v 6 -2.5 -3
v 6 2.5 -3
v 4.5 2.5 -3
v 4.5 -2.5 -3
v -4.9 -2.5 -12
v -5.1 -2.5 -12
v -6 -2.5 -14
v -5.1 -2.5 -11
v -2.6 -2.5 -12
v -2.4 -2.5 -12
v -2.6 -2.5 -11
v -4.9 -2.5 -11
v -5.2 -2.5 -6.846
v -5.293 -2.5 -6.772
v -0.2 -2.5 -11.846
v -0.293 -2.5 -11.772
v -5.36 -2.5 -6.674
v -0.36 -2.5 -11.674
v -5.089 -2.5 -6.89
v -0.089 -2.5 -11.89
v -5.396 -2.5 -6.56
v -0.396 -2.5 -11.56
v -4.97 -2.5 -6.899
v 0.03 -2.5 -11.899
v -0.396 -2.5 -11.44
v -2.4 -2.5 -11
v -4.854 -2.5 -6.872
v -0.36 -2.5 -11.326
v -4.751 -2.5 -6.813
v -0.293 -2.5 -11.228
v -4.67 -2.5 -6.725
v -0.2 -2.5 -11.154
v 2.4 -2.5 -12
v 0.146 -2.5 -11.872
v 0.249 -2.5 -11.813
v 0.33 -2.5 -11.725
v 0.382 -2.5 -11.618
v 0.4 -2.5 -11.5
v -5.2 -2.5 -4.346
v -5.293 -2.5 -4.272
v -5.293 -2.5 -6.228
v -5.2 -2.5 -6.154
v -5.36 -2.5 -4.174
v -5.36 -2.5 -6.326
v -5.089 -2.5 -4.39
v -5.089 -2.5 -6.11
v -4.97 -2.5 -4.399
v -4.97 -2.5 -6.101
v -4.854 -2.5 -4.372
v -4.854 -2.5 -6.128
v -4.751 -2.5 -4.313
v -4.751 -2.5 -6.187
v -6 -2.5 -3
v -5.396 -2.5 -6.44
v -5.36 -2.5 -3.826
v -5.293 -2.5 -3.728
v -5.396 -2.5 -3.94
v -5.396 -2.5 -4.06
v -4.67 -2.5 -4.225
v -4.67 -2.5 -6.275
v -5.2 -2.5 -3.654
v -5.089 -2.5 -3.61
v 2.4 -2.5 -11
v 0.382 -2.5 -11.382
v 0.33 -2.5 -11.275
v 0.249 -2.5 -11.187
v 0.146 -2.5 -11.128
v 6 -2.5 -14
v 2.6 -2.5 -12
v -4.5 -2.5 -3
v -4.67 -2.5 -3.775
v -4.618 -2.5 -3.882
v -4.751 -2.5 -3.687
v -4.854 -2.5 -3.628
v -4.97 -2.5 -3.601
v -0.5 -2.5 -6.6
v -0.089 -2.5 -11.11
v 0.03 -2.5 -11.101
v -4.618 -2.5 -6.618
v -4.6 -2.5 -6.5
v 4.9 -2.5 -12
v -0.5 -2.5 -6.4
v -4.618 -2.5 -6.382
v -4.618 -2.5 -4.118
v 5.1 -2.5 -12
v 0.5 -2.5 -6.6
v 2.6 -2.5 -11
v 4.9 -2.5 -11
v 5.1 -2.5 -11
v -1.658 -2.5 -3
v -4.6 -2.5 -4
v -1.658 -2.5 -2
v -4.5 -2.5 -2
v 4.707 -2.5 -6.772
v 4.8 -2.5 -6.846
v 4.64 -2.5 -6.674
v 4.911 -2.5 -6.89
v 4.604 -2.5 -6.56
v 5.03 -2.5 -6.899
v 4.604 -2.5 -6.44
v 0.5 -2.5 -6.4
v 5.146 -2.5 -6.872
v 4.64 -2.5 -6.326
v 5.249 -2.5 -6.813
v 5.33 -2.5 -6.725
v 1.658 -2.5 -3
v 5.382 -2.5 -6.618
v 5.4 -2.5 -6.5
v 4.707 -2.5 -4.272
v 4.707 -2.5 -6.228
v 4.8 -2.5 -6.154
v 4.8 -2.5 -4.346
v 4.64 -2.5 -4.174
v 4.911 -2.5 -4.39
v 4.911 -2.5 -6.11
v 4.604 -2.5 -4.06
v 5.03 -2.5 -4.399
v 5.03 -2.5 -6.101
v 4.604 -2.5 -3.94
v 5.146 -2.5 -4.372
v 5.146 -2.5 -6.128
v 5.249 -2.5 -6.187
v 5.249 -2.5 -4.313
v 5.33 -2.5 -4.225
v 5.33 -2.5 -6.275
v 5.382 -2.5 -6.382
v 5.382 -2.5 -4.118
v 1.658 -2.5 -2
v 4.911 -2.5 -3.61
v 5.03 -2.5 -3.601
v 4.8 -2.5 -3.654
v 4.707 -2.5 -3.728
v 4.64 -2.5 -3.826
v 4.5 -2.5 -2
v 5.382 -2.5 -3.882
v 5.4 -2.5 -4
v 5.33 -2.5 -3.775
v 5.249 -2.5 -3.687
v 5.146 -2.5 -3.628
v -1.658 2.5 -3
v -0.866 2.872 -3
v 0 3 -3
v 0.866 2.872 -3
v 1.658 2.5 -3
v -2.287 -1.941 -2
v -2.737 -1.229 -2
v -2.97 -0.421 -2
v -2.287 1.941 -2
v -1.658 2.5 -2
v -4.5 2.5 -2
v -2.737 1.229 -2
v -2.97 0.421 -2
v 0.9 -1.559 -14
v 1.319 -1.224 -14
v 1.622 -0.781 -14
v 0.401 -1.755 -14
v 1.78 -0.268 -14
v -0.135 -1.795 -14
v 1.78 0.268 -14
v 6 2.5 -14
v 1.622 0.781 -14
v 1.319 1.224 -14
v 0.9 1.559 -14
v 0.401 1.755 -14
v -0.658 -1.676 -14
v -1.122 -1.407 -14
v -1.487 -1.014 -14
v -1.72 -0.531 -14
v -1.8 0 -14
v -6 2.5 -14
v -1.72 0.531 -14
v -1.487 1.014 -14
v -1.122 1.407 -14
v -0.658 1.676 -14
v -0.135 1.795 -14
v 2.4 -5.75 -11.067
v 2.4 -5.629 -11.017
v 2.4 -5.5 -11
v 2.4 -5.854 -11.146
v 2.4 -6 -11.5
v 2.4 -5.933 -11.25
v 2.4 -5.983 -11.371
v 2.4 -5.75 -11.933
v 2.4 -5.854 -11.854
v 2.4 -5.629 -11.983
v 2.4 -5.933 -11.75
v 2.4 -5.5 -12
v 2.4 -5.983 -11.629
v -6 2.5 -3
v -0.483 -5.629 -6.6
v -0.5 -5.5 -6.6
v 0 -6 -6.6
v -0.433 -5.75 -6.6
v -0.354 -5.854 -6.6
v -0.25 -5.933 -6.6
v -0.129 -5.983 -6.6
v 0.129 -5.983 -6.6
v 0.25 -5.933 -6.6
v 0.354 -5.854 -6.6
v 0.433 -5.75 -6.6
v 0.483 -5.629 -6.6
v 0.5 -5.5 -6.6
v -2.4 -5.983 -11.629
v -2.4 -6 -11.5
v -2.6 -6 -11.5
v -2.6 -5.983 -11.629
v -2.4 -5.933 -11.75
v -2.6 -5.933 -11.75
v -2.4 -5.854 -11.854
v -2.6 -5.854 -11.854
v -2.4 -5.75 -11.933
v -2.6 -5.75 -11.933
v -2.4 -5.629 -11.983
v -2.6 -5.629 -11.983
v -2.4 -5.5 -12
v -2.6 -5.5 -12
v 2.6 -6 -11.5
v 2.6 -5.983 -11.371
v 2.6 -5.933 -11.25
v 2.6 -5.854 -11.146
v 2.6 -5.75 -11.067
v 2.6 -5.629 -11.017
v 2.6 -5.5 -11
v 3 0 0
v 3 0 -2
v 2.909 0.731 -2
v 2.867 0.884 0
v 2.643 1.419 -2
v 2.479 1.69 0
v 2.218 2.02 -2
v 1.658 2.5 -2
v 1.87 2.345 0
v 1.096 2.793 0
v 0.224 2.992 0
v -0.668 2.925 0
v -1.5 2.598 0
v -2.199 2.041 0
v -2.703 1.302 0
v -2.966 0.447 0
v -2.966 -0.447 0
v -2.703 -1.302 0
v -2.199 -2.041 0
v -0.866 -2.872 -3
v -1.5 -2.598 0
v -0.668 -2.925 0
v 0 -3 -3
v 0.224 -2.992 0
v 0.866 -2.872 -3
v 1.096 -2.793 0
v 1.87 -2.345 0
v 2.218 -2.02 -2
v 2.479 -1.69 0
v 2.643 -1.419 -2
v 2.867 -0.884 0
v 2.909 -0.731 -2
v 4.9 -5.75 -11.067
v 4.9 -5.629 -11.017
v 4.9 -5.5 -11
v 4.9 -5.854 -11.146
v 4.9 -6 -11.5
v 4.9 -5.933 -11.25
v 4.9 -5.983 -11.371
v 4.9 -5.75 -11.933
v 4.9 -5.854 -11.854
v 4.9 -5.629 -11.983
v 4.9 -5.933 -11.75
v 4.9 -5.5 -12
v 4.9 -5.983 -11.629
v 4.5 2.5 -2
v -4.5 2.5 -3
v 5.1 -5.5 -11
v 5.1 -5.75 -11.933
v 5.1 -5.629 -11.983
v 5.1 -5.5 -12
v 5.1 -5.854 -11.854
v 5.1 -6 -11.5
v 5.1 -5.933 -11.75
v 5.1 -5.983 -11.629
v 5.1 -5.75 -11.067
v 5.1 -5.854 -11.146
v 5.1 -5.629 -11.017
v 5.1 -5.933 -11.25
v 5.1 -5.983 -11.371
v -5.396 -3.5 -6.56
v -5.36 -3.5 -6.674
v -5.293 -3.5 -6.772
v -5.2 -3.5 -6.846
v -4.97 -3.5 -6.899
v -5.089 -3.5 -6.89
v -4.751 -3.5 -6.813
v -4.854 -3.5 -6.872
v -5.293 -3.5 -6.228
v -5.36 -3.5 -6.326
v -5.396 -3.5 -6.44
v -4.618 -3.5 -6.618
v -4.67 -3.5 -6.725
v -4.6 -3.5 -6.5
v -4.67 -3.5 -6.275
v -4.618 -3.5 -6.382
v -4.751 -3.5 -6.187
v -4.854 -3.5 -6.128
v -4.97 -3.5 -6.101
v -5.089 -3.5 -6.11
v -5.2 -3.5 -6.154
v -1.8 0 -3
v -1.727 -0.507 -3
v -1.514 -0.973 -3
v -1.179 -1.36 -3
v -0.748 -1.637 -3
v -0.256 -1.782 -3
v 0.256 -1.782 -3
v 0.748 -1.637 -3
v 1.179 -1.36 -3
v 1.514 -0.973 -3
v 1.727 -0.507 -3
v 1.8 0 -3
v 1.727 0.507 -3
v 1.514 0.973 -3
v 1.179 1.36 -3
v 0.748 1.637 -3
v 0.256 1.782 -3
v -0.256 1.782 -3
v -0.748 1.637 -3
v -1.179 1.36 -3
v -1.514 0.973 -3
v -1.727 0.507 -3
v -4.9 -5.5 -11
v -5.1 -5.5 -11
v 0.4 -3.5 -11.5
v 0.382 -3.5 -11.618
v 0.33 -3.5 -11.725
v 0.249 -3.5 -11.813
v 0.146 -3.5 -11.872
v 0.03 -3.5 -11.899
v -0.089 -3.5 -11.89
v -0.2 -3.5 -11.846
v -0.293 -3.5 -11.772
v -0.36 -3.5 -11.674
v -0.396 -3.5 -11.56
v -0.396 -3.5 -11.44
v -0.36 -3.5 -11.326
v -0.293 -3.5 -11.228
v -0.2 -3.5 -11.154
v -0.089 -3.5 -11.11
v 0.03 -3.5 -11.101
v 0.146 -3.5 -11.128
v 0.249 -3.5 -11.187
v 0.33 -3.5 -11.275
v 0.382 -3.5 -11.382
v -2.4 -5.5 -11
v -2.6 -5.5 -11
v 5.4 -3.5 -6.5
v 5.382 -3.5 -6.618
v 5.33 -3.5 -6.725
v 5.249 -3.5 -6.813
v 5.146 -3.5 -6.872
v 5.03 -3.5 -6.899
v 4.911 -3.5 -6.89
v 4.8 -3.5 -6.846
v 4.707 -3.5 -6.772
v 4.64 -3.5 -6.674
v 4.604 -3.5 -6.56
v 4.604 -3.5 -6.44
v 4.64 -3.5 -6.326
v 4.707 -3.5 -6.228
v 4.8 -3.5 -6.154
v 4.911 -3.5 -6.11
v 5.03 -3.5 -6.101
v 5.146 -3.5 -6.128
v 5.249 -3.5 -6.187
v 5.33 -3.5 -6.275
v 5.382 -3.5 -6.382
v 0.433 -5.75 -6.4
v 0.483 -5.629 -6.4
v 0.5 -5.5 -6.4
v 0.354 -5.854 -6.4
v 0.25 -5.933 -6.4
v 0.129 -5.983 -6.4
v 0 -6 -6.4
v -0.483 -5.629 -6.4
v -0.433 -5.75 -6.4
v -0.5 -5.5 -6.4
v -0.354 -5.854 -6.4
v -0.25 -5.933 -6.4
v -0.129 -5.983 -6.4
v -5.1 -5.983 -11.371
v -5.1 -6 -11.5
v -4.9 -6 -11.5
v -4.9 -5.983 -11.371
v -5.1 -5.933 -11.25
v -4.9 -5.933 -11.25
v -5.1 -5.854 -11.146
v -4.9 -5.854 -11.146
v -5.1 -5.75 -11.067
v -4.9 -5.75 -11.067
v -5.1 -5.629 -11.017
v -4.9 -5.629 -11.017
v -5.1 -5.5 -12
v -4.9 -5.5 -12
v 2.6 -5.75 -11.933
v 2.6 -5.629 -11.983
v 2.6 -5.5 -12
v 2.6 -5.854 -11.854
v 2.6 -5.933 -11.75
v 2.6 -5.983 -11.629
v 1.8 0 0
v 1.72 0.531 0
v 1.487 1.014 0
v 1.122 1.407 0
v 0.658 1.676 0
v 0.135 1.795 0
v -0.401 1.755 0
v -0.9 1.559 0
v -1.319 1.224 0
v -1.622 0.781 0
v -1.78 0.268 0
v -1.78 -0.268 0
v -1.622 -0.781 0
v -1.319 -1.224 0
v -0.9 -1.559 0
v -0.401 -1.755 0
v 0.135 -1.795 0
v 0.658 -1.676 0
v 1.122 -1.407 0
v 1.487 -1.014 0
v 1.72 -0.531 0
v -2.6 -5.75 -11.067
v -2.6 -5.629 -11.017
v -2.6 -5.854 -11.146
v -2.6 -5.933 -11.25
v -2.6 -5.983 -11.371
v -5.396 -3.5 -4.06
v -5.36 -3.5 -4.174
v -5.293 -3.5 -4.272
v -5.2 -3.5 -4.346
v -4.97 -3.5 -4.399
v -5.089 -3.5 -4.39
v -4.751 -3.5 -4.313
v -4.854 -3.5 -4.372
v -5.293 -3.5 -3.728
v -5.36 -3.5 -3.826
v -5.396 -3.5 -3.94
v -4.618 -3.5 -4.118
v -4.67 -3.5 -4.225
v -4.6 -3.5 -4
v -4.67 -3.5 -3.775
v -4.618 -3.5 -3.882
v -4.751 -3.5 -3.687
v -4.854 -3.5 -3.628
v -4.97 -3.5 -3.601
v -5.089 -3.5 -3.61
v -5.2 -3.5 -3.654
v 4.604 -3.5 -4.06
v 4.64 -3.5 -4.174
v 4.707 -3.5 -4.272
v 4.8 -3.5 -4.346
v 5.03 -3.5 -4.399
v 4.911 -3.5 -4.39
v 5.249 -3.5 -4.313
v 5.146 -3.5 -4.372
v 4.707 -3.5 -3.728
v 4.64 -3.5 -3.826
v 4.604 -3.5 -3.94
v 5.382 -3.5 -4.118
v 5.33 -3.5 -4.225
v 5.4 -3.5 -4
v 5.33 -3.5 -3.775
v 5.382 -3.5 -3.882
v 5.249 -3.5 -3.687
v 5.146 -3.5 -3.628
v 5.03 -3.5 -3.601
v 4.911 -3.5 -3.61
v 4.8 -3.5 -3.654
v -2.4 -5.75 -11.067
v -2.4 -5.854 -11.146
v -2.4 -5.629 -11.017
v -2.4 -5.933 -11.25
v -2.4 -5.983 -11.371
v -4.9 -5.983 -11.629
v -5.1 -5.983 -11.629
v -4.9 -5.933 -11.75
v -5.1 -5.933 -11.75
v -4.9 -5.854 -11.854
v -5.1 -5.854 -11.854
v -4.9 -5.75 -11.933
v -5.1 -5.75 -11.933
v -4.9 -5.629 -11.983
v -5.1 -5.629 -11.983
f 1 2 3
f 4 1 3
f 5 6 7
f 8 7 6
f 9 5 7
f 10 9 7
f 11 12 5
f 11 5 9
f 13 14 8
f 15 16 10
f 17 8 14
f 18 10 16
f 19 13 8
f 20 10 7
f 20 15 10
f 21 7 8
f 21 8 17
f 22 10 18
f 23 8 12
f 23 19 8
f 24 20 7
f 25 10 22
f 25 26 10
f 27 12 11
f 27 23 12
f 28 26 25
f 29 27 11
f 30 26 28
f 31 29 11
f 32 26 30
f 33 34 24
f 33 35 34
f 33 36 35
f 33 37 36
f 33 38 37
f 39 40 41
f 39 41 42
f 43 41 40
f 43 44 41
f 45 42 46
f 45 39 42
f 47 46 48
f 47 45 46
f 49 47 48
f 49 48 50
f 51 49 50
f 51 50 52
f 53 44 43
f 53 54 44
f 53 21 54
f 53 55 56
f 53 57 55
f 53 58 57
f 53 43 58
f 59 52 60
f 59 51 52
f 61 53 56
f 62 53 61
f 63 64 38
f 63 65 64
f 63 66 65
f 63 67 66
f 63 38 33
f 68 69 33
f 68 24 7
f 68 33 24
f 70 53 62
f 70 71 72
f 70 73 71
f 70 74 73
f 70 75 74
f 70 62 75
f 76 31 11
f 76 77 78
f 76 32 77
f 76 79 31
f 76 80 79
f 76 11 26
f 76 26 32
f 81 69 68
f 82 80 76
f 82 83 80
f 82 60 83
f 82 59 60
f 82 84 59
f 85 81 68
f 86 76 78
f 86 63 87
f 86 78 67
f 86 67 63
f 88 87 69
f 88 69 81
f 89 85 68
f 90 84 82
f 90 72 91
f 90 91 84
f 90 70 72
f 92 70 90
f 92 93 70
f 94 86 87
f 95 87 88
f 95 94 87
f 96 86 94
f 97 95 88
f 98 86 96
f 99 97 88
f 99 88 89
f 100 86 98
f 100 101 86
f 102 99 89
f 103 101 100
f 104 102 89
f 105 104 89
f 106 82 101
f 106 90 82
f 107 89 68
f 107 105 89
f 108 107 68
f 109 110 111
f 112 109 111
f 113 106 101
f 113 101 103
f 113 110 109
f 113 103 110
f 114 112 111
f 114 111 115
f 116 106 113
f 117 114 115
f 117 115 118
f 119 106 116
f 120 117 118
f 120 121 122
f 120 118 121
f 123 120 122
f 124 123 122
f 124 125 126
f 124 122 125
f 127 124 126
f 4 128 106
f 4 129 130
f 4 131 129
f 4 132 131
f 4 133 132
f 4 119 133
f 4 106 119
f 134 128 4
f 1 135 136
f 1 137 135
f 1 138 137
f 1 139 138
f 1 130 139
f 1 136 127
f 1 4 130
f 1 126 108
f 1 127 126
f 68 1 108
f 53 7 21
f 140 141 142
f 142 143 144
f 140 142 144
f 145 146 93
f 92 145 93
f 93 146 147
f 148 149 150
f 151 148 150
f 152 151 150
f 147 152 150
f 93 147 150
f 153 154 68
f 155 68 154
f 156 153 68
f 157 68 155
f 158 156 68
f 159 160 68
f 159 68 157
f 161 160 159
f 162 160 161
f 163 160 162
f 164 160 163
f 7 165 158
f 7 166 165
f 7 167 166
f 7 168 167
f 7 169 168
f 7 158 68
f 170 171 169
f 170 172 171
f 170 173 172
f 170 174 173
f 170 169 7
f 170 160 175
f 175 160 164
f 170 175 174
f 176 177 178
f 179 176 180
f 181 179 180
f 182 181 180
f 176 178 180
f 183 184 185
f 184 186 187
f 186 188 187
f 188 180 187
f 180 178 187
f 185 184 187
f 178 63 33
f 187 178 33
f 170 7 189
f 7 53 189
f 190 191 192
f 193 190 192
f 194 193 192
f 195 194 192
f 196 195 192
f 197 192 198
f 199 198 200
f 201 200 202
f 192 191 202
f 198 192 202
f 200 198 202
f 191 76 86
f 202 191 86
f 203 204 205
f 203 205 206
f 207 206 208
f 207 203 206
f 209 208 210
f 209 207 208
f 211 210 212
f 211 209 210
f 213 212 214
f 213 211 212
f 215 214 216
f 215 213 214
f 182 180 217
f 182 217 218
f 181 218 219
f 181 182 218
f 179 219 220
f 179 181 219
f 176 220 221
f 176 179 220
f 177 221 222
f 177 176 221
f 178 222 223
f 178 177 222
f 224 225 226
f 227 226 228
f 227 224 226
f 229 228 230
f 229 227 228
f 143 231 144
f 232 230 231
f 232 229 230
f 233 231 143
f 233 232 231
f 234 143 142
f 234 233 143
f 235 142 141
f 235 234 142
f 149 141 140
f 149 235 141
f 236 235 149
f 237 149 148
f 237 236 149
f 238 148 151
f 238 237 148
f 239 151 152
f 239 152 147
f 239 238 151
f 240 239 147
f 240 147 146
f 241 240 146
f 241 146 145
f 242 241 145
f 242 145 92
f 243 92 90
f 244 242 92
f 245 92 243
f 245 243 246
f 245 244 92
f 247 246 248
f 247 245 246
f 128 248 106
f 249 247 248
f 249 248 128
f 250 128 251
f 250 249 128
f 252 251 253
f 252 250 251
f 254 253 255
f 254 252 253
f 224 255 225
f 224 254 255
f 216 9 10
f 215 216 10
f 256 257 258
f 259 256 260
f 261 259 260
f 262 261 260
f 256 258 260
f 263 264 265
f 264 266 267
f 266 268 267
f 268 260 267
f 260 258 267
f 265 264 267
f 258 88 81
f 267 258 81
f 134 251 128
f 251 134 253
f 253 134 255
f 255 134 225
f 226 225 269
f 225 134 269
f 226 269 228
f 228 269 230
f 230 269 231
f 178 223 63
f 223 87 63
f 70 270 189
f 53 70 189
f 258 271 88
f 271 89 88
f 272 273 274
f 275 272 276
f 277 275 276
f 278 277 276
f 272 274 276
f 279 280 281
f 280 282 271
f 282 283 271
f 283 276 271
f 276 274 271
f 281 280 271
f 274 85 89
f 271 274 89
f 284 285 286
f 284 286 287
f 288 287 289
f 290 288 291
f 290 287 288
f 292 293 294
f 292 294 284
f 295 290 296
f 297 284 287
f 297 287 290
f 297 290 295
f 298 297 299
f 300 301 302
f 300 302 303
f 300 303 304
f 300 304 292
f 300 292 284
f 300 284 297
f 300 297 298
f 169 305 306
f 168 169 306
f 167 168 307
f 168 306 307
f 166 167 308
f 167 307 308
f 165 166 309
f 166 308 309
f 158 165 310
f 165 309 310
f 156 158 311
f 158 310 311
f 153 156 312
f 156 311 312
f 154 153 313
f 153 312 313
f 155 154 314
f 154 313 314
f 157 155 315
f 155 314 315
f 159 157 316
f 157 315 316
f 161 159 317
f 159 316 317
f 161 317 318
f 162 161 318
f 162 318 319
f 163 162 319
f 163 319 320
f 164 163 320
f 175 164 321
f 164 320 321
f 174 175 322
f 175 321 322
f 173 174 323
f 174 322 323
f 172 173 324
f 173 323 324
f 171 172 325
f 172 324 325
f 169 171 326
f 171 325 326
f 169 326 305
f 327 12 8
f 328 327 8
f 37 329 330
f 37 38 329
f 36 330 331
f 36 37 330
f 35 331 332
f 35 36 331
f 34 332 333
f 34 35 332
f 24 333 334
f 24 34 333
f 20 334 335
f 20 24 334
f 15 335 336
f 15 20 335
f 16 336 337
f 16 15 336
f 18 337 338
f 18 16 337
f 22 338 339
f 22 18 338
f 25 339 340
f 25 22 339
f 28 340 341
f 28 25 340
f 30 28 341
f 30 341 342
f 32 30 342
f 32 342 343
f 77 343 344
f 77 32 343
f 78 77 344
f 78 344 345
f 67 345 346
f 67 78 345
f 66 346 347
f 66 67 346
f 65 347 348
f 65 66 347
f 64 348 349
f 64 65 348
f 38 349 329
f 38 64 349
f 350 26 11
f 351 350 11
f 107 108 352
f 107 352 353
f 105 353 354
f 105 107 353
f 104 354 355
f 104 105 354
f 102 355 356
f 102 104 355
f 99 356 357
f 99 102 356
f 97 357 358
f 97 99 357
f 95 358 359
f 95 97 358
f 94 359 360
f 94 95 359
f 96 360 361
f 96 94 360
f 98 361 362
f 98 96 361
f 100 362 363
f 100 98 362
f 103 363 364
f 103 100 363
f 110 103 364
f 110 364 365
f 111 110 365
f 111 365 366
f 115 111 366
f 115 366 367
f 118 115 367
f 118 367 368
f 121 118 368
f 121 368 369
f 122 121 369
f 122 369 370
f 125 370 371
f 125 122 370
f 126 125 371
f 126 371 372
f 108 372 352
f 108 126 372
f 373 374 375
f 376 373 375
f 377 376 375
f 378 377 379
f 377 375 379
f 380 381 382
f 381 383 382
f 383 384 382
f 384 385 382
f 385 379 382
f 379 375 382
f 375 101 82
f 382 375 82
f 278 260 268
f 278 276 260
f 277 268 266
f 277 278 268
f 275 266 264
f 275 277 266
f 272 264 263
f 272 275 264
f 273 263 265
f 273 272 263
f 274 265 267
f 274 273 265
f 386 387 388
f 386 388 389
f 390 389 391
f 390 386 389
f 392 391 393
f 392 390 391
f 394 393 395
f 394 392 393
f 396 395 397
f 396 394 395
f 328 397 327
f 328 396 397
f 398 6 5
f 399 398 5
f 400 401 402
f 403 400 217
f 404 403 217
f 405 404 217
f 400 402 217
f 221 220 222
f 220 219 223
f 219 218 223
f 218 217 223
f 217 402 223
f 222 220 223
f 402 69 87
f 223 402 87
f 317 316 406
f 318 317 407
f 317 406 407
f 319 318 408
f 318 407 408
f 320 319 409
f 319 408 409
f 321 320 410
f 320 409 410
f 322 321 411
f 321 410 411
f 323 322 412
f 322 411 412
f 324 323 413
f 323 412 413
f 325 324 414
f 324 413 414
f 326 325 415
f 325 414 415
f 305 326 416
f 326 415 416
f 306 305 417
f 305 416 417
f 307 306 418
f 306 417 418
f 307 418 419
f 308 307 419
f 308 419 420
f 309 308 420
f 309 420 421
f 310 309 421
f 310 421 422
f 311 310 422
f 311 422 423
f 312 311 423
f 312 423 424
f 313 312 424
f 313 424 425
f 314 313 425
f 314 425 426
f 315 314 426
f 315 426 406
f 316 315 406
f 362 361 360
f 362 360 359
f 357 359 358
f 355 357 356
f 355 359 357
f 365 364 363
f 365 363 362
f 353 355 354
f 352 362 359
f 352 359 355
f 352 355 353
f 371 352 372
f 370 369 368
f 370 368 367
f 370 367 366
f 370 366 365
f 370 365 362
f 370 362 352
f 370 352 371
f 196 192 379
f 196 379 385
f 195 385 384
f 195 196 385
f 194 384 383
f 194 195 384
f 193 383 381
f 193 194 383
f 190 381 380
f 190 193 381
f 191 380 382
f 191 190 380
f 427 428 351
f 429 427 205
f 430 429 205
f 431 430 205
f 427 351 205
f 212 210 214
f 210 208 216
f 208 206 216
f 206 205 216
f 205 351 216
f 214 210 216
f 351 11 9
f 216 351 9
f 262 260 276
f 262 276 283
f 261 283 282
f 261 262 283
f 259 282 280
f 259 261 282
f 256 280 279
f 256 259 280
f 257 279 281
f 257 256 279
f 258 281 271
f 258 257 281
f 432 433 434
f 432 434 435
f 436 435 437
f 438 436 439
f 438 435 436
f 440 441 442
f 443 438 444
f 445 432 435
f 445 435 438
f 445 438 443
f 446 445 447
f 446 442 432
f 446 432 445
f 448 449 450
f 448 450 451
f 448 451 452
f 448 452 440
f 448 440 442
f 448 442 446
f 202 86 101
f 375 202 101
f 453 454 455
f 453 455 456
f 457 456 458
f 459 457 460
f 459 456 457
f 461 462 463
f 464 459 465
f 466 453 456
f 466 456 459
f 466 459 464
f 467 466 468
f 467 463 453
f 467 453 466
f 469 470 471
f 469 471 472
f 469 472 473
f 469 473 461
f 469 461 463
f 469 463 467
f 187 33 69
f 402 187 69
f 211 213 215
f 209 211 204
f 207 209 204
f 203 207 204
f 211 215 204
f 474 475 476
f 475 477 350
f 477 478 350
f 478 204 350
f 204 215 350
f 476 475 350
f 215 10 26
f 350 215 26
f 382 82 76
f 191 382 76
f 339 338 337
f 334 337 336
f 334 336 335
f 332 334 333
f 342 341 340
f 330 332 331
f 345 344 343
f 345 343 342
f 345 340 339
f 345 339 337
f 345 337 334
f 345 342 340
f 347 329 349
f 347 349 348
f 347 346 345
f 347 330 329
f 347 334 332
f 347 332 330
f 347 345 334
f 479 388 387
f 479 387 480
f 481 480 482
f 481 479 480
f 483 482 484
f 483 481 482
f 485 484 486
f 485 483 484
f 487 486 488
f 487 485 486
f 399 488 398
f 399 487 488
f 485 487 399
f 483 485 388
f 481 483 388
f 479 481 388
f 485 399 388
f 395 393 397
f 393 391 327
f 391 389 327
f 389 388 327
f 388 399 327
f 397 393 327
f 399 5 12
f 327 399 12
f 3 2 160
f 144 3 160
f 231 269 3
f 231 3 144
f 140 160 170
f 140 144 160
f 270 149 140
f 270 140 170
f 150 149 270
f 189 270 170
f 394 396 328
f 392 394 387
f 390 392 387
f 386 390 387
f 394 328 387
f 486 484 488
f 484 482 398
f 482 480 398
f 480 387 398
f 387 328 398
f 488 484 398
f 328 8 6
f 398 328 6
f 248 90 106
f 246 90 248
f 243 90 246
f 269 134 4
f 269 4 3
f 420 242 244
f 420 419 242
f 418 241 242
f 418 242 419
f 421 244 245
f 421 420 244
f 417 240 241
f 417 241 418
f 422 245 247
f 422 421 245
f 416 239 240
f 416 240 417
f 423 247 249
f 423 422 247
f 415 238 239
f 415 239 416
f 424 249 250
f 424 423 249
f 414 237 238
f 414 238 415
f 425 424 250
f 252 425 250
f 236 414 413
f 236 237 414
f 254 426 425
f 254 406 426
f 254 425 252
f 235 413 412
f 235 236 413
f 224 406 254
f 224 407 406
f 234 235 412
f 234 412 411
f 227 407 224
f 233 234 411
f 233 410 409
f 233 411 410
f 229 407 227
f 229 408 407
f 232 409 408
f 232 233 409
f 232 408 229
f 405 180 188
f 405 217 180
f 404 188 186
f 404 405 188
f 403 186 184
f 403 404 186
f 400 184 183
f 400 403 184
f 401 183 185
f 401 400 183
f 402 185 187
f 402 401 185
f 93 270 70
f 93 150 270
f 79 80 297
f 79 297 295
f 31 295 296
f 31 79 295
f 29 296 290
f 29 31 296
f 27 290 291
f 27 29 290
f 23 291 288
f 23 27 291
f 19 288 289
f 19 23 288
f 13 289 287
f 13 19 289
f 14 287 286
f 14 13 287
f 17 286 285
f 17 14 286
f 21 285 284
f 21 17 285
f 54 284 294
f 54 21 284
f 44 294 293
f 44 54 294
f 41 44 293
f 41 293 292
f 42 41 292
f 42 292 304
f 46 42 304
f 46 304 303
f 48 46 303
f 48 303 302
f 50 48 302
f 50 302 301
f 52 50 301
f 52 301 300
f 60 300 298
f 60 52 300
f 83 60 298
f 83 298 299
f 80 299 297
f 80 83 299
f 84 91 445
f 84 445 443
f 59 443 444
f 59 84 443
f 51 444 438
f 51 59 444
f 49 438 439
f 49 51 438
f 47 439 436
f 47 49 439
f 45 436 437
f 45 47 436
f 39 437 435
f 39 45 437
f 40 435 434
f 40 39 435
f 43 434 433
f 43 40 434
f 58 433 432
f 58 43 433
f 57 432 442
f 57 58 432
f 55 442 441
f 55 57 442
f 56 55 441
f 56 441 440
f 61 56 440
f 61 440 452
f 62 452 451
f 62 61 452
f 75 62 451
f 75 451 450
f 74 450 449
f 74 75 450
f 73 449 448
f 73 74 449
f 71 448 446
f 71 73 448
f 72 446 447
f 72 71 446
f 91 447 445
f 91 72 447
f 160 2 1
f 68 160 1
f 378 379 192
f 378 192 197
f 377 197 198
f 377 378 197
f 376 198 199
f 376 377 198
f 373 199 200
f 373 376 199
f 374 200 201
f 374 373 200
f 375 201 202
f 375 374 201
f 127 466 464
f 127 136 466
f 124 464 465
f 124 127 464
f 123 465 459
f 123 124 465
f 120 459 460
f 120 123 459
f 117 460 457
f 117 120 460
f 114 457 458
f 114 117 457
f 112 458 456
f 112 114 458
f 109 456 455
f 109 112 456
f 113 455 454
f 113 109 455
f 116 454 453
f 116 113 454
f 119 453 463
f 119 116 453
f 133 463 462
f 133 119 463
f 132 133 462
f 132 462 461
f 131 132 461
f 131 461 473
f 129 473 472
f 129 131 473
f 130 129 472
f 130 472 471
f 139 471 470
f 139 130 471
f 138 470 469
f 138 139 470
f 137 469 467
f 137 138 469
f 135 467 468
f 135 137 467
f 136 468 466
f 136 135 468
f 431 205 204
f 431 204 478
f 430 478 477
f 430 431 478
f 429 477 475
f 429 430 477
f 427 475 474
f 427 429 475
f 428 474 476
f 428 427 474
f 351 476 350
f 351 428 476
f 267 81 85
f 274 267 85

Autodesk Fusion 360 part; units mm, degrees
sketch "Sketch1" plane through (0, 0, 0) normal (0, 0, 1) x (1, 0, 0) in component "PJ3F07-5P"
  circle A0 centre (0, 0) radius 1.8
  circle A1 centre (0, 0) radius 3
  dimension "d1" = 3.6
  dimension "d2" = 6
extrude "Extrude1" add sketch "Sketch1" against normal blind 3 in component "PJ3F07-5P"
ref_plane "WorkPlane1" through (0, 0, -2) normal (0, 0, -1) x (-1, 0, 0) in component "PJ3F07-5P"
sketch "Sketch2" plane through (0, 0, -2) normal (0, 0, -1) x (-1, 0, 0) in component "PJ3F07-5P"
  line L0 (-4.5, 2.5) -> (4.5, 2.5)
  line L1 (4.5, 2.5) -> (4.5, -2.5)
  line L2 (4.5, -2.5) -> (-4.5, -2.5)
  line L3 (-4.5, -2.5) -> (-4.5, 2.5)
  line L4 (-4.5, 2.5) -> (4.5, -2.5) construction
  line L5 (4.5, 2.5) -> (-4.5, -2.5) construction
  circle A0 centre (0, 0) radius 1.8
  circle A1 centre (0, 0) radius 3
  dimension "d6" = 9
  dimension "d7" = 5
extrude "Extrude2" add sketch "Sketch2" along normal blind 1 contours L0 L2 L3 A1 | L0 L1 L2 A1 in component "PJ3F07-5P"
sketch "Sketch3" plane through (0, 0, -3) normal (0, 0, -1) x (-1, 0, 0) in component "PJ3F07-5P"
  circle A0 centre (0, 0) radius 1.8
  arc A1 (-1.6583, -2.5) -> (1.6583, -2.5) centre (0, 0) ccw
  line L0 (1.6583, -2.5) -> (4.5, -2.5)
  line L1 (4.5, -2.5) -> (4.5, 2.5)
  line L2 (4.5, 2.5) -> (1.6583, 2.5)
  arc A2 (1.6583, 2.5) -> (-1.6583, 2.5) centre (0, 0) ccw
  line L3 (-1.6583, 2.5) -> (-4.5, 2.5)
  line L4 (-4.5, 2.5) -> (-4.5, -2.5)
  line L5 (-4.5, -2.5) -> (-1.6583, -2.5)
  line L6 (6, 2.5) -> (-6, 2.5)
  line L7 (-6, 2.5) -> (-6, -2.5)
  line L8 (-6, -2.5) -> (6, -2.5)
  line L9 (6, -2.5) -> (6, 2.5)
  line L10 (6, 2.5) -> (-6, -2.5) construction
  line L11 (-6, 2.5) -> (6, -2.5) construction
  dimension "d10" = 12
  dimension "d11" = 5
extrude "Extrude3" add sketch "Sketch3" along normal blind 11 contours L0 L1 L2 L3 L4 L5 L6 L8 | L4 L6 L7 L8 | L1 L6 L8 L9 in component "PJ3F07-5P"
sketch "Sketch4" plane through (0, -2.5, 0) normal (0, -1, 0) x (1, 0, 0) in component "PJ3F07-5P"
  line L0 (-1.6583, -2) -> (-4.5, -2)
  line L1 (-4.5, -2) -> (-4.5, -3)
  line L2 (-4.5, -3) -> (-6, -3)
  line L3 (-6, -3) -> (-6, -14)
  line L4 (-6, -14) -> (6, -14)
  line L5 (6, -14) -> (6, -3)
  line L6 (6, -3) -> (4.5, -3)
  line L7 (4.5, -3) -> (4.5, -2)
  line L8 (4.5, -2) -> (1.6583, -2)
  line L9 (1.6583, -2) -> (1.6583, -3)
  line L10 (1.6583, -3) -> (-1.6583, -3)
  line L11 (-1.6583, -3) -> (-1.6583, -2)
  circle A0 centre (5, -4) radius 0.5
  circle A1 centre (5, -6.5) radius 0.5
  circle A2 centre (-5, -4) radius 0.5
  circle A3 centre (-5, -6.5) radius 0.5
  circle A4 centre (0, -11.5) radius 0.5
  line L12 (0.75, -6.9) -> (-0.75, -6.9)
  line L13 (-0.75, -6.9) -> (-0.75, -6.1)
  line L14 (-0.75, -6.1) -> (0.75, -6.1)
  line L15 (0.75, -6.1) -> (0.75, -6.9)
  line L16 (0.75, -6.9) -> (-0.75, -6.1) construction
  line L17 (-0.75, -6.9) -> (0.75, -6.1) construction
  line L18 (-2.9, -12.25) -> (-2.1, -12.25)
  line L19 (-2.1, -12.25) -> (-2.1, -10.75)
  line L20 (-2.1, -10.75) -> (-2.9, -10.75)
  line L21 (-2.9, -10.75) -> (-2.9, -12.25)
  line L22 (-2.9, -12.25) -> (-2.1, -10.75) construction
  line L23 (-2.1, -12.25) -> (-2.9, -10.75) construction
  line L24 (-5.4, -12.25) -> (-4.6, -12.25)
  line L25 (-4.6, -12.25) -> (-4.6, -10.75)
  line L26 (-4.6, -10.75) -> (-5.4, -10.75)
  line L27 (-5.4, -10.75) -> (-5.4, -12.25)
  line L28 (-5.4, -12.25) -> (-4.6, -10.75) construction
  line L29 (-4.6, -12.25) -> (-5.4, -10.75) construction
  line L30 (4.6, -12.25) -> (5.4, -12.25)
  line L31 (5.4, -12.25) -> (5.4, -10.75)
  line L32 (5.4, -10.75) -> (4.6, -10.75)
  line L33 (4.6, -10.75) -> (4.6, -12.25)
  line L34 (4.6, -12.25) -> (5.4, -10.75) construction
  line L35 (5.4, -12.25) -> (4.6, -10.75) construction
  line L36 (2.1, -12.25) -> (2.9, -12.25)
  line L37 (2.9, -12.25) -> (2.9, -10.75)
  line L38 (2.9, -10.75) -> (2.1, -10.75)
  line L39 (2.1, -10.75) -> (2.1, -12.25)
  line L40 (2.1, -12.25) -> (2.9, -10.75) construction
  line L41 (2.9, -12.25) -> (2.1, -10.75) construction
  line L42 (-1.6583, -2) -> (1.6583, -2) construction
  line L43 (0, -2) -> (0, -14) construction
  line L44 (-5, -14) -> (-5, -3) construction
  line L45 (5, -14) -> (5, -3) construction
  line L46 (5.1, -11) -> (4.9, -11)
  line L47 (4.9, -11) -> (4.9, -12)
  line L48 (4.9, -12) -> (5.1, -12)
  line L49 (5.1, -12) -> (5.1, -11)
  line L50 (5.1, -11) -> (4.9, -12) construction
  line L51 (4.9, -11) -> (5.1, -12) construction
  line L52 (2.6, -11) -> (2.4, -11)
  line L53 (2.4, -11) -> (2.4, -12)
  line L54 (2.4, -12) -> (2.6, -12)
  line L55 (2.6, -12) -> (2.6, -11)
  line L56 (2.6, -11) -> (2.4, -12) construction
  line L57 (2.4, -11) -> (2.6, -12) construction
  line L58 (-2.4, -11) -> (-2.6, -11)
  line L59 (-2.6, -11) -> (-2.6, -12)
  line L60 (-2.6, -12) -> (-2.4, -12)
  line L61 (-2.4, -12) -> (-2.4, -11)
  line L62 (-2.4, -11) -> (-2.6, -12) construction
  line L63 (-2.6, -11) -> (-2.4, -12) construction
  line L64 (-4.9, -11) -> (-5.1, -11)
  line L65 (-5.1, -11) -> (-5.1, -12)
  line L66 (-5.1, -12) -> (-4.9, -12)
  line L67 (-4.9, -12) -> (-4.9, -11)
  line L68 (-4.9, -11) -> (-5.1, -12) construction
  line L69 (-5.1, -11) -> (-4.9, -12) construction
  line L70 (0.5, -6.4) -> (-0.5, -6.4)
  line L71 (-0.5, -6.4) -> (-0.5, -6.6)
  line L72 (-0.5, -6.6) -> (0.5, -6.6)
  line L73 (0.5, -6.6) -> (0.5, -6.4)
  line L74 (0.5, -6.4) -> (-0.5, -6.6) construction
  line L75 (-0.5, -6.4) -> (0.5, -6.6) construction
  circle A5 centre (-5, -4) radius 0.4
  circle A6 centre (-5, -6.5) radius 0.4
  circle A7 centre (0, -11.5) radius 0.4
  circle A8 centre (5, -6.5) radius 0.4
  circle A9 centre (5, -4) radius 0.4
  point P0 (0, -6.5)
  point P1 (-2.5, -11.5)
  point P2 (-5, -11.5)
  point P3 (5, -11.5)
  point P4 (2.5, -11.5)
  point P5 (5, -11.5)
  point P6 (2.5, -11.5)
  point P7 (-2.5, -11.5)
  point P8 (-5, -11.5)
  point P9 (0, -6.5)
  dimension "d14" = 1
  dimension "d15" = 1
  dimension "d16" = 1
  dimension "d17" = 1
  dimension "d18" = 1
  dimension "d19" = 1
  dimension "d20" = 0.8
  dimension "d21" = 1.5
  dimension "d23" = 2.5
  dimension "d24" = 4.5
  dimension "d25" = 1
  dimension "d26" = 2.5
  dimension "d27" = 1.5
  dimension "d28" = 0.8
  dimension "d29" = 0.8
  dimension "d30" = 1.5
  dimension "d31" = 1.5
  dimension "d32" = 0.8
  dimension "d33" = 0.8
  dimension "d34" = 1.5
  dimension "d35" = 5
  dimension "d36" = 2.5
  dimension "d37" = 10
  dimension "d38" = 5
  dimension "d39" = 5
  dimension "d40" = 9.5
  dimension "d41" = 9.5
  dimension "d42" = 9.5
  dimension "d43" = 9.5
  dimension "d44" = 1
  dimension "d45" = 1
  dimension "d48" = 0.2
  dimension "d49" = 1
  dimension "d50" = 1
  dimension "d51" = 0.2
  dimension "d52" = 0.2
  dimension "d53" = 1
  dimension "d54" = 0.2
  dimension "d55" = 1
  dimension "d56" = 1
  dimension "d57" = 0.2
  dimension "d58" = 0.8
  dimension "d59" = 0.8
  dimension "d60" = 0.8
  dimension "d61" = 0.8
  dimension "d62" = 0.8
extrude "Extrude5" add sketch "Sketch4" along normal blind 1 contours A5 | A6 | A7 | A8 | A9 in component "PJ3F07-5P"
extrude "Extrude6" add sketch "Sketch4" along normal blind 3.5 contours L46 L47 L48 L49 | L52 L53 L54 L55 | L58 L59 L60 L61 | L64 L65 L66 L67 | L70 L71 L72 L73 in component "PJ3F07-5P"
fillet "Fillet1" radius 0.5 10 edges at (-5, -6, -12) (-5, -6, -11) (-2.5, -6, -12) (-2.5, -6, -11) (2.5, -6, -12) (2.5, -6, -11) (5, -6, -12) (5, -6, -11) (0.5, -6, -6.5) (-0.5, -6, -6.5) in component "PJ3F07-5P"
component "PJ3F07-5P" placed x (1, 0, 0) y (0, 1, 0) z (0, 0, 1) at (0, 0, 0)
